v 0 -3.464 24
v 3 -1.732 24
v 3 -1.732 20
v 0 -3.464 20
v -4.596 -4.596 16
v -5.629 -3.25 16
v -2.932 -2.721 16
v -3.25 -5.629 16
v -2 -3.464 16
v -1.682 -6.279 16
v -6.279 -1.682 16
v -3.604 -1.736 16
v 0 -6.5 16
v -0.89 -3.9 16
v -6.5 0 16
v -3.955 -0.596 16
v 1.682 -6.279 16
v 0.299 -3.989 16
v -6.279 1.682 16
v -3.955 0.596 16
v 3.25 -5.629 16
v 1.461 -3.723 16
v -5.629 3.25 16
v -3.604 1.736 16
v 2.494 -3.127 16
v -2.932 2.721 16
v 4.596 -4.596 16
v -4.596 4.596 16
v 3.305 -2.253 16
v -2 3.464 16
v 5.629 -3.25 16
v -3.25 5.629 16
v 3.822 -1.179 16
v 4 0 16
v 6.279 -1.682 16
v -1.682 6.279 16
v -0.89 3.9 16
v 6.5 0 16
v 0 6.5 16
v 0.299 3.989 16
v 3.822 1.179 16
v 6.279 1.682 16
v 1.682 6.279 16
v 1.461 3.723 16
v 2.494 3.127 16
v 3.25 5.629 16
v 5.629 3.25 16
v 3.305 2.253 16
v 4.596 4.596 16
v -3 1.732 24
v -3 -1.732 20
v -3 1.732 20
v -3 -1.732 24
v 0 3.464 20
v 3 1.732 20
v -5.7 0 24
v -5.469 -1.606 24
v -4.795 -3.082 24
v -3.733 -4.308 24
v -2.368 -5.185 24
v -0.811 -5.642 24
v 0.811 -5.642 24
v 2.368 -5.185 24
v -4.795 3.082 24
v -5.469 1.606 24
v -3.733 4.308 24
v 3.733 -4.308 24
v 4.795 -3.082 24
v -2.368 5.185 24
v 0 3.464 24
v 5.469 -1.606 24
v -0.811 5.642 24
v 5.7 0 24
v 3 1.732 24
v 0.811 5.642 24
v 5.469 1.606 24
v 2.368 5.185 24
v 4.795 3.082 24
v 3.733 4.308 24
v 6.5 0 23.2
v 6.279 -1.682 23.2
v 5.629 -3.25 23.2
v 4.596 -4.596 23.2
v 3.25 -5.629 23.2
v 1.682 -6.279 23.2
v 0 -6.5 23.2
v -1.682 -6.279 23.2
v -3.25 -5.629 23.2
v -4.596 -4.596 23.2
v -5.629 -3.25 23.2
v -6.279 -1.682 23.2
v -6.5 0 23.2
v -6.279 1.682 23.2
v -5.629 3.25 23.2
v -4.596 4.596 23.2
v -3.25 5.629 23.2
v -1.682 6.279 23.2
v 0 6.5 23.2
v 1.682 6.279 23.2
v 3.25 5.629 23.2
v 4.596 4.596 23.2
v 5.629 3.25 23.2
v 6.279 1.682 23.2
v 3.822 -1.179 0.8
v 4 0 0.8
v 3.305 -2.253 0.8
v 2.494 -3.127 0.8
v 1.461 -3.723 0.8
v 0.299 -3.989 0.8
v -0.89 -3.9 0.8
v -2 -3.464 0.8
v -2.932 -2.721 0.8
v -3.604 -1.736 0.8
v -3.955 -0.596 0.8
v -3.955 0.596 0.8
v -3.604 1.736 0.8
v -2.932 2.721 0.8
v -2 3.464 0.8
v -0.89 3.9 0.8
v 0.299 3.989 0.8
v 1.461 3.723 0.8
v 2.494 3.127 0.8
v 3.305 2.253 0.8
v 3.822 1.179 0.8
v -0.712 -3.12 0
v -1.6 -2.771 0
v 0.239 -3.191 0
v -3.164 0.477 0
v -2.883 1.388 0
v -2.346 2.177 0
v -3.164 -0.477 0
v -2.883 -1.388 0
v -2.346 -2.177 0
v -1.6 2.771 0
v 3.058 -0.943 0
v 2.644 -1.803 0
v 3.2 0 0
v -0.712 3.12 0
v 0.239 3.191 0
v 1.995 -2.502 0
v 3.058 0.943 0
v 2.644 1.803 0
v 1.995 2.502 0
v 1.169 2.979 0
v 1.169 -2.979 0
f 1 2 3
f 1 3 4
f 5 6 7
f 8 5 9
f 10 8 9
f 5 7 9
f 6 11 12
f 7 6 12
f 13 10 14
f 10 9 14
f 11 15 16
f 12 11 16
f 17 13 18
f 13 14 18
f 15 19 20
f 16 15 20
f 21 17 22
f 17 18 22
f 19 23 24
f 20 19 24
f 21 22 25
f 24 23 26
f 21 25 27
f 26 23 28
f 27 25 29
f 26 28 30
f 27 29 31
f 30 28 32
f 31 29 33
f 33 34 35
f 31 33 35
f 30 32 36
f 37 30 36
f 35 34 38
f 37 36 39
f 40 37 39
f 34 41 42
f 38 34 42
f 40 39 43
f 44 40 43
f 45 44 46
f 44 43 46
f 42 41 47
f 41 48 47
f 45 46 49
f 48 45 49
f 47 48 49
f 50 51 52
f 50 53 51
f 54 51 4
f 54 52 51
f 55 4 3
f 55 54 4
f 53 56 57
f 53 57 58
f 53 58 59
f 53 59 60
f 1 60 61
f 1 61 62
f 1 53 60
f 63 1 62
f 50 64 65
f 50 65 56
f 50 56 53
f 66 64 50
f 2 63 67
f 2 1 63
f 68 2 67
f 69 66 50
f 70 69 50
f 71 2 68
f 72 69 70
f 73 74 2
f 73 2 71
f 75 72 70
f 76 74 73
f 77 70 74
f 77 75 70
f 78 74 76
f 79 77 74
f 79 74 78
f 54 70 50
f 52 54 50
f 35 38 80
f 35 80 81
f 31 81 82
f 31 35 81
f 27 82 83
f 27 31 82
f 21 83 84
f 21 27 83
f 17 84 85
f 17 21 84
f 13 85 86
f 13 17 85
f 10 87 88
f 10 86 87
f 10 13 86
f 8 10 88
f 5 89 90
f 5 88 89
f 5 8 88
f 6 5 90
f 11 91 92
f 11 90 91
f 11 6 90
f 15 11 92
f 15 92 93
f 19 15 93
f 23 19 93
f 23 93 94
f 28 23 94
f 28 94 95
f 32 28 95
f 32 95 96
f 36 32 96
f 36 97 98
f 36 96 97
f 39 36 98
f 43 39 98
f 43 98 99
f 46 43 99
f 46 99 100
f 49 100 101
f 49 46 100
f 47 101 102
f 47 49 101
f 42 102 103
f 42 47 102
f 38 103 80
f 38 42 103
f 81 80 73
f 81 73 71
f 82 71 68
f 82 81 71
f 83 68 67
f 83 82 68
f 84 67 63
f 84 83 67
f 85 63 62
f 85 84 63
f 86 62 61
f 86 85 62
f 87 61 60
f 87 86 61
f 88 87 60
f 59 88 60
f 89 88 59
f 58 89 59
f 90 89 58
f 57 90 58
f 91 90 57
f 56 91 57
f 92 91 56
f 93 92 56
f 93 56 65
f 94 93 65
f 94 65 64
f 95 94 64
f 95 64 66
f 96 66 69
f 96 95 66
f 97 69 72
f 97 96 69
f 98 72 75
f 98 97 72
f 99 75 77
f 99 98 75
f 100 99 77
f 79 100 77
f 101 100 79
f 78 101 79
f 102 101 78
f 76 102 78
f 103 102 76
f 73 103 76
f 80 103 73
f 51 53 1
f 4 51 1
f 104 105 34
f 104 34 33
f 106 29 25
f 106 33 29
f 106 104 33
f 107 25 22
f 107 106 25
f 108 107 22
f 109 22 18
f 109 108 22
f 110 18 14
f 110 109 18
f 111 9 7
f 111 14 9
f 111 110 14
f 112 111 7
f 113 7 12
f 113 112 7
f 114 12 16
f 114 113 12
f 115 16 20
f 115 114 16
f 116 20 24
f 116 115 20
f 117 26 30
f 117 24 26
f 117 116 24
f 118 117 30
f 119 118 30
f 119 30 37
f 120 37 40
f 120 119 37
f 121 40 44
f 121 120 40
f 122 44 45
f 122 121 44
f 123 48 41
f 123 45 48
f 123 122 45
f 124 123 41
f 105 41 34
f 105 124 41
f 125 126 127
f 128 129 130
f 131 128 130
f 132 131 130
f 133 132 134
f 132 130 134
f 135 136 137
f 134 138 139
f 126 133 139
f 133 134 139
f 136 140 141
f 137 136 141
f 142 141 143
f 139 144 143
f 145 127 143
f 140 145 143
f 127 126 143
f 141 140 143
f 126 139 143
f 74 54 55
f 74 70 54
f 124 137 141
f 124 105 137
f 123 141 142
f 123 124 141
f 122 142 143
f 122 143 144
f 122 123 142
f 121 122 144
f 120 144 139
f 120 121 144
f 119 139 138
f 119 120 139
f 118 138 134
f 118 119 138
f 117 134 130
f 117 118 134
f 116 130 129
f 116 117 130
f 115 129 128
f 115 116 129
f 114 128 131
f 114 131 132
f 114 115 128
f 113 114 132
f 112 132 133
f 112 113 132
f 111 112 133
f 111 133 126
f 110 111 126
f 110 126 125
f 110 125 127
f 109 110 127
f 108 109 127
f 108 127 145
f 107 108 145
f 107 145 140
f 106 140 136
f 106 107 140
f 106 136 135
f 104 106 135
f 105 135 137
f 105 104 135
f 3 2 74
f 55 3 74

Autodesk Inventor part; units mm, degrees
ref_plane "YZ Plane" through (0, 0, 0) normal (1, 0, 0) x (0, 1, 0)
ref_plane "XZ Plane" through (0, 0, 0) normal (0, 1, 0) x (-1, 0, 0)
ref_plane "XY Plane" through (0, 0, 0) normal (0, 0, 1) x (1, 0, 0)
sketch "Sketch1" plane through (0, 0, 0) normal (0, 0, 1) x (1, 0, 0)
  circle A0 centre (0, 0) radius 4
  dimension "Diameter" = 8
extrude "Extrusion1" add sketch "Sketch1" along normal blind 16
sketch "Sketch2" plane through (0, 0, 16) normal (0, 0, 1) x (1, 0, 0)
  circle A0 centre (0, 0) radius 4 projected
  circle A1 centre (0, 0) radius 6.5
  dimension "Head_Diameter" = 13
extrude "Extrusion2" add sketch "Sketch2" along normal blind 8 contours A0 | A1
sketch "Sketch3" plane through (0, 0, 24) normal (0, 0, 1) x (1, 0, 0)
  circle A0 centre (0, 0) radius 6.5 projected
  circle A1 centre (0, 0) radius 3.4641 construction
  line L0 (0, 3.4641) -> (3, 1.7321)
  line L1 (3, -1.7321) -> (3, 1.7321)
  line L2 (0, 3.4641) -> (-3, 1.7321)
  line L3 (-3, -1.7321) -> (-3, 1.7321)
  line L4 (-3, -1.7321) -> (0, -3.4641)
  line L5 (3, -1.7321) -> (0, -3.4641)
  dimension "Hex_Width" = 6
extrude "Extrusion3" cut sketch "Sketch3" against normal blind 4 contours L0 L1 L5 L4 L3 L2
thread "Thread1" size "M8x1.25" class "4g6g" standard "ANSI Metric M Profile" length 16
chamfer "Chamfer1" distance 0.8 angle 45 2 edges at (-6.5, 0, 24) (-4, 0, 0)
equation "\"d9\" = ThreadLength"
equation "\"d12\" = Chamfer"
equation "\"ThreadLength\" = 16"
equation "\"Chamfer\" = 0.8"
properties part number "SCREW,SOCKET HD,P,12.9,M8X1.25X16MM"
